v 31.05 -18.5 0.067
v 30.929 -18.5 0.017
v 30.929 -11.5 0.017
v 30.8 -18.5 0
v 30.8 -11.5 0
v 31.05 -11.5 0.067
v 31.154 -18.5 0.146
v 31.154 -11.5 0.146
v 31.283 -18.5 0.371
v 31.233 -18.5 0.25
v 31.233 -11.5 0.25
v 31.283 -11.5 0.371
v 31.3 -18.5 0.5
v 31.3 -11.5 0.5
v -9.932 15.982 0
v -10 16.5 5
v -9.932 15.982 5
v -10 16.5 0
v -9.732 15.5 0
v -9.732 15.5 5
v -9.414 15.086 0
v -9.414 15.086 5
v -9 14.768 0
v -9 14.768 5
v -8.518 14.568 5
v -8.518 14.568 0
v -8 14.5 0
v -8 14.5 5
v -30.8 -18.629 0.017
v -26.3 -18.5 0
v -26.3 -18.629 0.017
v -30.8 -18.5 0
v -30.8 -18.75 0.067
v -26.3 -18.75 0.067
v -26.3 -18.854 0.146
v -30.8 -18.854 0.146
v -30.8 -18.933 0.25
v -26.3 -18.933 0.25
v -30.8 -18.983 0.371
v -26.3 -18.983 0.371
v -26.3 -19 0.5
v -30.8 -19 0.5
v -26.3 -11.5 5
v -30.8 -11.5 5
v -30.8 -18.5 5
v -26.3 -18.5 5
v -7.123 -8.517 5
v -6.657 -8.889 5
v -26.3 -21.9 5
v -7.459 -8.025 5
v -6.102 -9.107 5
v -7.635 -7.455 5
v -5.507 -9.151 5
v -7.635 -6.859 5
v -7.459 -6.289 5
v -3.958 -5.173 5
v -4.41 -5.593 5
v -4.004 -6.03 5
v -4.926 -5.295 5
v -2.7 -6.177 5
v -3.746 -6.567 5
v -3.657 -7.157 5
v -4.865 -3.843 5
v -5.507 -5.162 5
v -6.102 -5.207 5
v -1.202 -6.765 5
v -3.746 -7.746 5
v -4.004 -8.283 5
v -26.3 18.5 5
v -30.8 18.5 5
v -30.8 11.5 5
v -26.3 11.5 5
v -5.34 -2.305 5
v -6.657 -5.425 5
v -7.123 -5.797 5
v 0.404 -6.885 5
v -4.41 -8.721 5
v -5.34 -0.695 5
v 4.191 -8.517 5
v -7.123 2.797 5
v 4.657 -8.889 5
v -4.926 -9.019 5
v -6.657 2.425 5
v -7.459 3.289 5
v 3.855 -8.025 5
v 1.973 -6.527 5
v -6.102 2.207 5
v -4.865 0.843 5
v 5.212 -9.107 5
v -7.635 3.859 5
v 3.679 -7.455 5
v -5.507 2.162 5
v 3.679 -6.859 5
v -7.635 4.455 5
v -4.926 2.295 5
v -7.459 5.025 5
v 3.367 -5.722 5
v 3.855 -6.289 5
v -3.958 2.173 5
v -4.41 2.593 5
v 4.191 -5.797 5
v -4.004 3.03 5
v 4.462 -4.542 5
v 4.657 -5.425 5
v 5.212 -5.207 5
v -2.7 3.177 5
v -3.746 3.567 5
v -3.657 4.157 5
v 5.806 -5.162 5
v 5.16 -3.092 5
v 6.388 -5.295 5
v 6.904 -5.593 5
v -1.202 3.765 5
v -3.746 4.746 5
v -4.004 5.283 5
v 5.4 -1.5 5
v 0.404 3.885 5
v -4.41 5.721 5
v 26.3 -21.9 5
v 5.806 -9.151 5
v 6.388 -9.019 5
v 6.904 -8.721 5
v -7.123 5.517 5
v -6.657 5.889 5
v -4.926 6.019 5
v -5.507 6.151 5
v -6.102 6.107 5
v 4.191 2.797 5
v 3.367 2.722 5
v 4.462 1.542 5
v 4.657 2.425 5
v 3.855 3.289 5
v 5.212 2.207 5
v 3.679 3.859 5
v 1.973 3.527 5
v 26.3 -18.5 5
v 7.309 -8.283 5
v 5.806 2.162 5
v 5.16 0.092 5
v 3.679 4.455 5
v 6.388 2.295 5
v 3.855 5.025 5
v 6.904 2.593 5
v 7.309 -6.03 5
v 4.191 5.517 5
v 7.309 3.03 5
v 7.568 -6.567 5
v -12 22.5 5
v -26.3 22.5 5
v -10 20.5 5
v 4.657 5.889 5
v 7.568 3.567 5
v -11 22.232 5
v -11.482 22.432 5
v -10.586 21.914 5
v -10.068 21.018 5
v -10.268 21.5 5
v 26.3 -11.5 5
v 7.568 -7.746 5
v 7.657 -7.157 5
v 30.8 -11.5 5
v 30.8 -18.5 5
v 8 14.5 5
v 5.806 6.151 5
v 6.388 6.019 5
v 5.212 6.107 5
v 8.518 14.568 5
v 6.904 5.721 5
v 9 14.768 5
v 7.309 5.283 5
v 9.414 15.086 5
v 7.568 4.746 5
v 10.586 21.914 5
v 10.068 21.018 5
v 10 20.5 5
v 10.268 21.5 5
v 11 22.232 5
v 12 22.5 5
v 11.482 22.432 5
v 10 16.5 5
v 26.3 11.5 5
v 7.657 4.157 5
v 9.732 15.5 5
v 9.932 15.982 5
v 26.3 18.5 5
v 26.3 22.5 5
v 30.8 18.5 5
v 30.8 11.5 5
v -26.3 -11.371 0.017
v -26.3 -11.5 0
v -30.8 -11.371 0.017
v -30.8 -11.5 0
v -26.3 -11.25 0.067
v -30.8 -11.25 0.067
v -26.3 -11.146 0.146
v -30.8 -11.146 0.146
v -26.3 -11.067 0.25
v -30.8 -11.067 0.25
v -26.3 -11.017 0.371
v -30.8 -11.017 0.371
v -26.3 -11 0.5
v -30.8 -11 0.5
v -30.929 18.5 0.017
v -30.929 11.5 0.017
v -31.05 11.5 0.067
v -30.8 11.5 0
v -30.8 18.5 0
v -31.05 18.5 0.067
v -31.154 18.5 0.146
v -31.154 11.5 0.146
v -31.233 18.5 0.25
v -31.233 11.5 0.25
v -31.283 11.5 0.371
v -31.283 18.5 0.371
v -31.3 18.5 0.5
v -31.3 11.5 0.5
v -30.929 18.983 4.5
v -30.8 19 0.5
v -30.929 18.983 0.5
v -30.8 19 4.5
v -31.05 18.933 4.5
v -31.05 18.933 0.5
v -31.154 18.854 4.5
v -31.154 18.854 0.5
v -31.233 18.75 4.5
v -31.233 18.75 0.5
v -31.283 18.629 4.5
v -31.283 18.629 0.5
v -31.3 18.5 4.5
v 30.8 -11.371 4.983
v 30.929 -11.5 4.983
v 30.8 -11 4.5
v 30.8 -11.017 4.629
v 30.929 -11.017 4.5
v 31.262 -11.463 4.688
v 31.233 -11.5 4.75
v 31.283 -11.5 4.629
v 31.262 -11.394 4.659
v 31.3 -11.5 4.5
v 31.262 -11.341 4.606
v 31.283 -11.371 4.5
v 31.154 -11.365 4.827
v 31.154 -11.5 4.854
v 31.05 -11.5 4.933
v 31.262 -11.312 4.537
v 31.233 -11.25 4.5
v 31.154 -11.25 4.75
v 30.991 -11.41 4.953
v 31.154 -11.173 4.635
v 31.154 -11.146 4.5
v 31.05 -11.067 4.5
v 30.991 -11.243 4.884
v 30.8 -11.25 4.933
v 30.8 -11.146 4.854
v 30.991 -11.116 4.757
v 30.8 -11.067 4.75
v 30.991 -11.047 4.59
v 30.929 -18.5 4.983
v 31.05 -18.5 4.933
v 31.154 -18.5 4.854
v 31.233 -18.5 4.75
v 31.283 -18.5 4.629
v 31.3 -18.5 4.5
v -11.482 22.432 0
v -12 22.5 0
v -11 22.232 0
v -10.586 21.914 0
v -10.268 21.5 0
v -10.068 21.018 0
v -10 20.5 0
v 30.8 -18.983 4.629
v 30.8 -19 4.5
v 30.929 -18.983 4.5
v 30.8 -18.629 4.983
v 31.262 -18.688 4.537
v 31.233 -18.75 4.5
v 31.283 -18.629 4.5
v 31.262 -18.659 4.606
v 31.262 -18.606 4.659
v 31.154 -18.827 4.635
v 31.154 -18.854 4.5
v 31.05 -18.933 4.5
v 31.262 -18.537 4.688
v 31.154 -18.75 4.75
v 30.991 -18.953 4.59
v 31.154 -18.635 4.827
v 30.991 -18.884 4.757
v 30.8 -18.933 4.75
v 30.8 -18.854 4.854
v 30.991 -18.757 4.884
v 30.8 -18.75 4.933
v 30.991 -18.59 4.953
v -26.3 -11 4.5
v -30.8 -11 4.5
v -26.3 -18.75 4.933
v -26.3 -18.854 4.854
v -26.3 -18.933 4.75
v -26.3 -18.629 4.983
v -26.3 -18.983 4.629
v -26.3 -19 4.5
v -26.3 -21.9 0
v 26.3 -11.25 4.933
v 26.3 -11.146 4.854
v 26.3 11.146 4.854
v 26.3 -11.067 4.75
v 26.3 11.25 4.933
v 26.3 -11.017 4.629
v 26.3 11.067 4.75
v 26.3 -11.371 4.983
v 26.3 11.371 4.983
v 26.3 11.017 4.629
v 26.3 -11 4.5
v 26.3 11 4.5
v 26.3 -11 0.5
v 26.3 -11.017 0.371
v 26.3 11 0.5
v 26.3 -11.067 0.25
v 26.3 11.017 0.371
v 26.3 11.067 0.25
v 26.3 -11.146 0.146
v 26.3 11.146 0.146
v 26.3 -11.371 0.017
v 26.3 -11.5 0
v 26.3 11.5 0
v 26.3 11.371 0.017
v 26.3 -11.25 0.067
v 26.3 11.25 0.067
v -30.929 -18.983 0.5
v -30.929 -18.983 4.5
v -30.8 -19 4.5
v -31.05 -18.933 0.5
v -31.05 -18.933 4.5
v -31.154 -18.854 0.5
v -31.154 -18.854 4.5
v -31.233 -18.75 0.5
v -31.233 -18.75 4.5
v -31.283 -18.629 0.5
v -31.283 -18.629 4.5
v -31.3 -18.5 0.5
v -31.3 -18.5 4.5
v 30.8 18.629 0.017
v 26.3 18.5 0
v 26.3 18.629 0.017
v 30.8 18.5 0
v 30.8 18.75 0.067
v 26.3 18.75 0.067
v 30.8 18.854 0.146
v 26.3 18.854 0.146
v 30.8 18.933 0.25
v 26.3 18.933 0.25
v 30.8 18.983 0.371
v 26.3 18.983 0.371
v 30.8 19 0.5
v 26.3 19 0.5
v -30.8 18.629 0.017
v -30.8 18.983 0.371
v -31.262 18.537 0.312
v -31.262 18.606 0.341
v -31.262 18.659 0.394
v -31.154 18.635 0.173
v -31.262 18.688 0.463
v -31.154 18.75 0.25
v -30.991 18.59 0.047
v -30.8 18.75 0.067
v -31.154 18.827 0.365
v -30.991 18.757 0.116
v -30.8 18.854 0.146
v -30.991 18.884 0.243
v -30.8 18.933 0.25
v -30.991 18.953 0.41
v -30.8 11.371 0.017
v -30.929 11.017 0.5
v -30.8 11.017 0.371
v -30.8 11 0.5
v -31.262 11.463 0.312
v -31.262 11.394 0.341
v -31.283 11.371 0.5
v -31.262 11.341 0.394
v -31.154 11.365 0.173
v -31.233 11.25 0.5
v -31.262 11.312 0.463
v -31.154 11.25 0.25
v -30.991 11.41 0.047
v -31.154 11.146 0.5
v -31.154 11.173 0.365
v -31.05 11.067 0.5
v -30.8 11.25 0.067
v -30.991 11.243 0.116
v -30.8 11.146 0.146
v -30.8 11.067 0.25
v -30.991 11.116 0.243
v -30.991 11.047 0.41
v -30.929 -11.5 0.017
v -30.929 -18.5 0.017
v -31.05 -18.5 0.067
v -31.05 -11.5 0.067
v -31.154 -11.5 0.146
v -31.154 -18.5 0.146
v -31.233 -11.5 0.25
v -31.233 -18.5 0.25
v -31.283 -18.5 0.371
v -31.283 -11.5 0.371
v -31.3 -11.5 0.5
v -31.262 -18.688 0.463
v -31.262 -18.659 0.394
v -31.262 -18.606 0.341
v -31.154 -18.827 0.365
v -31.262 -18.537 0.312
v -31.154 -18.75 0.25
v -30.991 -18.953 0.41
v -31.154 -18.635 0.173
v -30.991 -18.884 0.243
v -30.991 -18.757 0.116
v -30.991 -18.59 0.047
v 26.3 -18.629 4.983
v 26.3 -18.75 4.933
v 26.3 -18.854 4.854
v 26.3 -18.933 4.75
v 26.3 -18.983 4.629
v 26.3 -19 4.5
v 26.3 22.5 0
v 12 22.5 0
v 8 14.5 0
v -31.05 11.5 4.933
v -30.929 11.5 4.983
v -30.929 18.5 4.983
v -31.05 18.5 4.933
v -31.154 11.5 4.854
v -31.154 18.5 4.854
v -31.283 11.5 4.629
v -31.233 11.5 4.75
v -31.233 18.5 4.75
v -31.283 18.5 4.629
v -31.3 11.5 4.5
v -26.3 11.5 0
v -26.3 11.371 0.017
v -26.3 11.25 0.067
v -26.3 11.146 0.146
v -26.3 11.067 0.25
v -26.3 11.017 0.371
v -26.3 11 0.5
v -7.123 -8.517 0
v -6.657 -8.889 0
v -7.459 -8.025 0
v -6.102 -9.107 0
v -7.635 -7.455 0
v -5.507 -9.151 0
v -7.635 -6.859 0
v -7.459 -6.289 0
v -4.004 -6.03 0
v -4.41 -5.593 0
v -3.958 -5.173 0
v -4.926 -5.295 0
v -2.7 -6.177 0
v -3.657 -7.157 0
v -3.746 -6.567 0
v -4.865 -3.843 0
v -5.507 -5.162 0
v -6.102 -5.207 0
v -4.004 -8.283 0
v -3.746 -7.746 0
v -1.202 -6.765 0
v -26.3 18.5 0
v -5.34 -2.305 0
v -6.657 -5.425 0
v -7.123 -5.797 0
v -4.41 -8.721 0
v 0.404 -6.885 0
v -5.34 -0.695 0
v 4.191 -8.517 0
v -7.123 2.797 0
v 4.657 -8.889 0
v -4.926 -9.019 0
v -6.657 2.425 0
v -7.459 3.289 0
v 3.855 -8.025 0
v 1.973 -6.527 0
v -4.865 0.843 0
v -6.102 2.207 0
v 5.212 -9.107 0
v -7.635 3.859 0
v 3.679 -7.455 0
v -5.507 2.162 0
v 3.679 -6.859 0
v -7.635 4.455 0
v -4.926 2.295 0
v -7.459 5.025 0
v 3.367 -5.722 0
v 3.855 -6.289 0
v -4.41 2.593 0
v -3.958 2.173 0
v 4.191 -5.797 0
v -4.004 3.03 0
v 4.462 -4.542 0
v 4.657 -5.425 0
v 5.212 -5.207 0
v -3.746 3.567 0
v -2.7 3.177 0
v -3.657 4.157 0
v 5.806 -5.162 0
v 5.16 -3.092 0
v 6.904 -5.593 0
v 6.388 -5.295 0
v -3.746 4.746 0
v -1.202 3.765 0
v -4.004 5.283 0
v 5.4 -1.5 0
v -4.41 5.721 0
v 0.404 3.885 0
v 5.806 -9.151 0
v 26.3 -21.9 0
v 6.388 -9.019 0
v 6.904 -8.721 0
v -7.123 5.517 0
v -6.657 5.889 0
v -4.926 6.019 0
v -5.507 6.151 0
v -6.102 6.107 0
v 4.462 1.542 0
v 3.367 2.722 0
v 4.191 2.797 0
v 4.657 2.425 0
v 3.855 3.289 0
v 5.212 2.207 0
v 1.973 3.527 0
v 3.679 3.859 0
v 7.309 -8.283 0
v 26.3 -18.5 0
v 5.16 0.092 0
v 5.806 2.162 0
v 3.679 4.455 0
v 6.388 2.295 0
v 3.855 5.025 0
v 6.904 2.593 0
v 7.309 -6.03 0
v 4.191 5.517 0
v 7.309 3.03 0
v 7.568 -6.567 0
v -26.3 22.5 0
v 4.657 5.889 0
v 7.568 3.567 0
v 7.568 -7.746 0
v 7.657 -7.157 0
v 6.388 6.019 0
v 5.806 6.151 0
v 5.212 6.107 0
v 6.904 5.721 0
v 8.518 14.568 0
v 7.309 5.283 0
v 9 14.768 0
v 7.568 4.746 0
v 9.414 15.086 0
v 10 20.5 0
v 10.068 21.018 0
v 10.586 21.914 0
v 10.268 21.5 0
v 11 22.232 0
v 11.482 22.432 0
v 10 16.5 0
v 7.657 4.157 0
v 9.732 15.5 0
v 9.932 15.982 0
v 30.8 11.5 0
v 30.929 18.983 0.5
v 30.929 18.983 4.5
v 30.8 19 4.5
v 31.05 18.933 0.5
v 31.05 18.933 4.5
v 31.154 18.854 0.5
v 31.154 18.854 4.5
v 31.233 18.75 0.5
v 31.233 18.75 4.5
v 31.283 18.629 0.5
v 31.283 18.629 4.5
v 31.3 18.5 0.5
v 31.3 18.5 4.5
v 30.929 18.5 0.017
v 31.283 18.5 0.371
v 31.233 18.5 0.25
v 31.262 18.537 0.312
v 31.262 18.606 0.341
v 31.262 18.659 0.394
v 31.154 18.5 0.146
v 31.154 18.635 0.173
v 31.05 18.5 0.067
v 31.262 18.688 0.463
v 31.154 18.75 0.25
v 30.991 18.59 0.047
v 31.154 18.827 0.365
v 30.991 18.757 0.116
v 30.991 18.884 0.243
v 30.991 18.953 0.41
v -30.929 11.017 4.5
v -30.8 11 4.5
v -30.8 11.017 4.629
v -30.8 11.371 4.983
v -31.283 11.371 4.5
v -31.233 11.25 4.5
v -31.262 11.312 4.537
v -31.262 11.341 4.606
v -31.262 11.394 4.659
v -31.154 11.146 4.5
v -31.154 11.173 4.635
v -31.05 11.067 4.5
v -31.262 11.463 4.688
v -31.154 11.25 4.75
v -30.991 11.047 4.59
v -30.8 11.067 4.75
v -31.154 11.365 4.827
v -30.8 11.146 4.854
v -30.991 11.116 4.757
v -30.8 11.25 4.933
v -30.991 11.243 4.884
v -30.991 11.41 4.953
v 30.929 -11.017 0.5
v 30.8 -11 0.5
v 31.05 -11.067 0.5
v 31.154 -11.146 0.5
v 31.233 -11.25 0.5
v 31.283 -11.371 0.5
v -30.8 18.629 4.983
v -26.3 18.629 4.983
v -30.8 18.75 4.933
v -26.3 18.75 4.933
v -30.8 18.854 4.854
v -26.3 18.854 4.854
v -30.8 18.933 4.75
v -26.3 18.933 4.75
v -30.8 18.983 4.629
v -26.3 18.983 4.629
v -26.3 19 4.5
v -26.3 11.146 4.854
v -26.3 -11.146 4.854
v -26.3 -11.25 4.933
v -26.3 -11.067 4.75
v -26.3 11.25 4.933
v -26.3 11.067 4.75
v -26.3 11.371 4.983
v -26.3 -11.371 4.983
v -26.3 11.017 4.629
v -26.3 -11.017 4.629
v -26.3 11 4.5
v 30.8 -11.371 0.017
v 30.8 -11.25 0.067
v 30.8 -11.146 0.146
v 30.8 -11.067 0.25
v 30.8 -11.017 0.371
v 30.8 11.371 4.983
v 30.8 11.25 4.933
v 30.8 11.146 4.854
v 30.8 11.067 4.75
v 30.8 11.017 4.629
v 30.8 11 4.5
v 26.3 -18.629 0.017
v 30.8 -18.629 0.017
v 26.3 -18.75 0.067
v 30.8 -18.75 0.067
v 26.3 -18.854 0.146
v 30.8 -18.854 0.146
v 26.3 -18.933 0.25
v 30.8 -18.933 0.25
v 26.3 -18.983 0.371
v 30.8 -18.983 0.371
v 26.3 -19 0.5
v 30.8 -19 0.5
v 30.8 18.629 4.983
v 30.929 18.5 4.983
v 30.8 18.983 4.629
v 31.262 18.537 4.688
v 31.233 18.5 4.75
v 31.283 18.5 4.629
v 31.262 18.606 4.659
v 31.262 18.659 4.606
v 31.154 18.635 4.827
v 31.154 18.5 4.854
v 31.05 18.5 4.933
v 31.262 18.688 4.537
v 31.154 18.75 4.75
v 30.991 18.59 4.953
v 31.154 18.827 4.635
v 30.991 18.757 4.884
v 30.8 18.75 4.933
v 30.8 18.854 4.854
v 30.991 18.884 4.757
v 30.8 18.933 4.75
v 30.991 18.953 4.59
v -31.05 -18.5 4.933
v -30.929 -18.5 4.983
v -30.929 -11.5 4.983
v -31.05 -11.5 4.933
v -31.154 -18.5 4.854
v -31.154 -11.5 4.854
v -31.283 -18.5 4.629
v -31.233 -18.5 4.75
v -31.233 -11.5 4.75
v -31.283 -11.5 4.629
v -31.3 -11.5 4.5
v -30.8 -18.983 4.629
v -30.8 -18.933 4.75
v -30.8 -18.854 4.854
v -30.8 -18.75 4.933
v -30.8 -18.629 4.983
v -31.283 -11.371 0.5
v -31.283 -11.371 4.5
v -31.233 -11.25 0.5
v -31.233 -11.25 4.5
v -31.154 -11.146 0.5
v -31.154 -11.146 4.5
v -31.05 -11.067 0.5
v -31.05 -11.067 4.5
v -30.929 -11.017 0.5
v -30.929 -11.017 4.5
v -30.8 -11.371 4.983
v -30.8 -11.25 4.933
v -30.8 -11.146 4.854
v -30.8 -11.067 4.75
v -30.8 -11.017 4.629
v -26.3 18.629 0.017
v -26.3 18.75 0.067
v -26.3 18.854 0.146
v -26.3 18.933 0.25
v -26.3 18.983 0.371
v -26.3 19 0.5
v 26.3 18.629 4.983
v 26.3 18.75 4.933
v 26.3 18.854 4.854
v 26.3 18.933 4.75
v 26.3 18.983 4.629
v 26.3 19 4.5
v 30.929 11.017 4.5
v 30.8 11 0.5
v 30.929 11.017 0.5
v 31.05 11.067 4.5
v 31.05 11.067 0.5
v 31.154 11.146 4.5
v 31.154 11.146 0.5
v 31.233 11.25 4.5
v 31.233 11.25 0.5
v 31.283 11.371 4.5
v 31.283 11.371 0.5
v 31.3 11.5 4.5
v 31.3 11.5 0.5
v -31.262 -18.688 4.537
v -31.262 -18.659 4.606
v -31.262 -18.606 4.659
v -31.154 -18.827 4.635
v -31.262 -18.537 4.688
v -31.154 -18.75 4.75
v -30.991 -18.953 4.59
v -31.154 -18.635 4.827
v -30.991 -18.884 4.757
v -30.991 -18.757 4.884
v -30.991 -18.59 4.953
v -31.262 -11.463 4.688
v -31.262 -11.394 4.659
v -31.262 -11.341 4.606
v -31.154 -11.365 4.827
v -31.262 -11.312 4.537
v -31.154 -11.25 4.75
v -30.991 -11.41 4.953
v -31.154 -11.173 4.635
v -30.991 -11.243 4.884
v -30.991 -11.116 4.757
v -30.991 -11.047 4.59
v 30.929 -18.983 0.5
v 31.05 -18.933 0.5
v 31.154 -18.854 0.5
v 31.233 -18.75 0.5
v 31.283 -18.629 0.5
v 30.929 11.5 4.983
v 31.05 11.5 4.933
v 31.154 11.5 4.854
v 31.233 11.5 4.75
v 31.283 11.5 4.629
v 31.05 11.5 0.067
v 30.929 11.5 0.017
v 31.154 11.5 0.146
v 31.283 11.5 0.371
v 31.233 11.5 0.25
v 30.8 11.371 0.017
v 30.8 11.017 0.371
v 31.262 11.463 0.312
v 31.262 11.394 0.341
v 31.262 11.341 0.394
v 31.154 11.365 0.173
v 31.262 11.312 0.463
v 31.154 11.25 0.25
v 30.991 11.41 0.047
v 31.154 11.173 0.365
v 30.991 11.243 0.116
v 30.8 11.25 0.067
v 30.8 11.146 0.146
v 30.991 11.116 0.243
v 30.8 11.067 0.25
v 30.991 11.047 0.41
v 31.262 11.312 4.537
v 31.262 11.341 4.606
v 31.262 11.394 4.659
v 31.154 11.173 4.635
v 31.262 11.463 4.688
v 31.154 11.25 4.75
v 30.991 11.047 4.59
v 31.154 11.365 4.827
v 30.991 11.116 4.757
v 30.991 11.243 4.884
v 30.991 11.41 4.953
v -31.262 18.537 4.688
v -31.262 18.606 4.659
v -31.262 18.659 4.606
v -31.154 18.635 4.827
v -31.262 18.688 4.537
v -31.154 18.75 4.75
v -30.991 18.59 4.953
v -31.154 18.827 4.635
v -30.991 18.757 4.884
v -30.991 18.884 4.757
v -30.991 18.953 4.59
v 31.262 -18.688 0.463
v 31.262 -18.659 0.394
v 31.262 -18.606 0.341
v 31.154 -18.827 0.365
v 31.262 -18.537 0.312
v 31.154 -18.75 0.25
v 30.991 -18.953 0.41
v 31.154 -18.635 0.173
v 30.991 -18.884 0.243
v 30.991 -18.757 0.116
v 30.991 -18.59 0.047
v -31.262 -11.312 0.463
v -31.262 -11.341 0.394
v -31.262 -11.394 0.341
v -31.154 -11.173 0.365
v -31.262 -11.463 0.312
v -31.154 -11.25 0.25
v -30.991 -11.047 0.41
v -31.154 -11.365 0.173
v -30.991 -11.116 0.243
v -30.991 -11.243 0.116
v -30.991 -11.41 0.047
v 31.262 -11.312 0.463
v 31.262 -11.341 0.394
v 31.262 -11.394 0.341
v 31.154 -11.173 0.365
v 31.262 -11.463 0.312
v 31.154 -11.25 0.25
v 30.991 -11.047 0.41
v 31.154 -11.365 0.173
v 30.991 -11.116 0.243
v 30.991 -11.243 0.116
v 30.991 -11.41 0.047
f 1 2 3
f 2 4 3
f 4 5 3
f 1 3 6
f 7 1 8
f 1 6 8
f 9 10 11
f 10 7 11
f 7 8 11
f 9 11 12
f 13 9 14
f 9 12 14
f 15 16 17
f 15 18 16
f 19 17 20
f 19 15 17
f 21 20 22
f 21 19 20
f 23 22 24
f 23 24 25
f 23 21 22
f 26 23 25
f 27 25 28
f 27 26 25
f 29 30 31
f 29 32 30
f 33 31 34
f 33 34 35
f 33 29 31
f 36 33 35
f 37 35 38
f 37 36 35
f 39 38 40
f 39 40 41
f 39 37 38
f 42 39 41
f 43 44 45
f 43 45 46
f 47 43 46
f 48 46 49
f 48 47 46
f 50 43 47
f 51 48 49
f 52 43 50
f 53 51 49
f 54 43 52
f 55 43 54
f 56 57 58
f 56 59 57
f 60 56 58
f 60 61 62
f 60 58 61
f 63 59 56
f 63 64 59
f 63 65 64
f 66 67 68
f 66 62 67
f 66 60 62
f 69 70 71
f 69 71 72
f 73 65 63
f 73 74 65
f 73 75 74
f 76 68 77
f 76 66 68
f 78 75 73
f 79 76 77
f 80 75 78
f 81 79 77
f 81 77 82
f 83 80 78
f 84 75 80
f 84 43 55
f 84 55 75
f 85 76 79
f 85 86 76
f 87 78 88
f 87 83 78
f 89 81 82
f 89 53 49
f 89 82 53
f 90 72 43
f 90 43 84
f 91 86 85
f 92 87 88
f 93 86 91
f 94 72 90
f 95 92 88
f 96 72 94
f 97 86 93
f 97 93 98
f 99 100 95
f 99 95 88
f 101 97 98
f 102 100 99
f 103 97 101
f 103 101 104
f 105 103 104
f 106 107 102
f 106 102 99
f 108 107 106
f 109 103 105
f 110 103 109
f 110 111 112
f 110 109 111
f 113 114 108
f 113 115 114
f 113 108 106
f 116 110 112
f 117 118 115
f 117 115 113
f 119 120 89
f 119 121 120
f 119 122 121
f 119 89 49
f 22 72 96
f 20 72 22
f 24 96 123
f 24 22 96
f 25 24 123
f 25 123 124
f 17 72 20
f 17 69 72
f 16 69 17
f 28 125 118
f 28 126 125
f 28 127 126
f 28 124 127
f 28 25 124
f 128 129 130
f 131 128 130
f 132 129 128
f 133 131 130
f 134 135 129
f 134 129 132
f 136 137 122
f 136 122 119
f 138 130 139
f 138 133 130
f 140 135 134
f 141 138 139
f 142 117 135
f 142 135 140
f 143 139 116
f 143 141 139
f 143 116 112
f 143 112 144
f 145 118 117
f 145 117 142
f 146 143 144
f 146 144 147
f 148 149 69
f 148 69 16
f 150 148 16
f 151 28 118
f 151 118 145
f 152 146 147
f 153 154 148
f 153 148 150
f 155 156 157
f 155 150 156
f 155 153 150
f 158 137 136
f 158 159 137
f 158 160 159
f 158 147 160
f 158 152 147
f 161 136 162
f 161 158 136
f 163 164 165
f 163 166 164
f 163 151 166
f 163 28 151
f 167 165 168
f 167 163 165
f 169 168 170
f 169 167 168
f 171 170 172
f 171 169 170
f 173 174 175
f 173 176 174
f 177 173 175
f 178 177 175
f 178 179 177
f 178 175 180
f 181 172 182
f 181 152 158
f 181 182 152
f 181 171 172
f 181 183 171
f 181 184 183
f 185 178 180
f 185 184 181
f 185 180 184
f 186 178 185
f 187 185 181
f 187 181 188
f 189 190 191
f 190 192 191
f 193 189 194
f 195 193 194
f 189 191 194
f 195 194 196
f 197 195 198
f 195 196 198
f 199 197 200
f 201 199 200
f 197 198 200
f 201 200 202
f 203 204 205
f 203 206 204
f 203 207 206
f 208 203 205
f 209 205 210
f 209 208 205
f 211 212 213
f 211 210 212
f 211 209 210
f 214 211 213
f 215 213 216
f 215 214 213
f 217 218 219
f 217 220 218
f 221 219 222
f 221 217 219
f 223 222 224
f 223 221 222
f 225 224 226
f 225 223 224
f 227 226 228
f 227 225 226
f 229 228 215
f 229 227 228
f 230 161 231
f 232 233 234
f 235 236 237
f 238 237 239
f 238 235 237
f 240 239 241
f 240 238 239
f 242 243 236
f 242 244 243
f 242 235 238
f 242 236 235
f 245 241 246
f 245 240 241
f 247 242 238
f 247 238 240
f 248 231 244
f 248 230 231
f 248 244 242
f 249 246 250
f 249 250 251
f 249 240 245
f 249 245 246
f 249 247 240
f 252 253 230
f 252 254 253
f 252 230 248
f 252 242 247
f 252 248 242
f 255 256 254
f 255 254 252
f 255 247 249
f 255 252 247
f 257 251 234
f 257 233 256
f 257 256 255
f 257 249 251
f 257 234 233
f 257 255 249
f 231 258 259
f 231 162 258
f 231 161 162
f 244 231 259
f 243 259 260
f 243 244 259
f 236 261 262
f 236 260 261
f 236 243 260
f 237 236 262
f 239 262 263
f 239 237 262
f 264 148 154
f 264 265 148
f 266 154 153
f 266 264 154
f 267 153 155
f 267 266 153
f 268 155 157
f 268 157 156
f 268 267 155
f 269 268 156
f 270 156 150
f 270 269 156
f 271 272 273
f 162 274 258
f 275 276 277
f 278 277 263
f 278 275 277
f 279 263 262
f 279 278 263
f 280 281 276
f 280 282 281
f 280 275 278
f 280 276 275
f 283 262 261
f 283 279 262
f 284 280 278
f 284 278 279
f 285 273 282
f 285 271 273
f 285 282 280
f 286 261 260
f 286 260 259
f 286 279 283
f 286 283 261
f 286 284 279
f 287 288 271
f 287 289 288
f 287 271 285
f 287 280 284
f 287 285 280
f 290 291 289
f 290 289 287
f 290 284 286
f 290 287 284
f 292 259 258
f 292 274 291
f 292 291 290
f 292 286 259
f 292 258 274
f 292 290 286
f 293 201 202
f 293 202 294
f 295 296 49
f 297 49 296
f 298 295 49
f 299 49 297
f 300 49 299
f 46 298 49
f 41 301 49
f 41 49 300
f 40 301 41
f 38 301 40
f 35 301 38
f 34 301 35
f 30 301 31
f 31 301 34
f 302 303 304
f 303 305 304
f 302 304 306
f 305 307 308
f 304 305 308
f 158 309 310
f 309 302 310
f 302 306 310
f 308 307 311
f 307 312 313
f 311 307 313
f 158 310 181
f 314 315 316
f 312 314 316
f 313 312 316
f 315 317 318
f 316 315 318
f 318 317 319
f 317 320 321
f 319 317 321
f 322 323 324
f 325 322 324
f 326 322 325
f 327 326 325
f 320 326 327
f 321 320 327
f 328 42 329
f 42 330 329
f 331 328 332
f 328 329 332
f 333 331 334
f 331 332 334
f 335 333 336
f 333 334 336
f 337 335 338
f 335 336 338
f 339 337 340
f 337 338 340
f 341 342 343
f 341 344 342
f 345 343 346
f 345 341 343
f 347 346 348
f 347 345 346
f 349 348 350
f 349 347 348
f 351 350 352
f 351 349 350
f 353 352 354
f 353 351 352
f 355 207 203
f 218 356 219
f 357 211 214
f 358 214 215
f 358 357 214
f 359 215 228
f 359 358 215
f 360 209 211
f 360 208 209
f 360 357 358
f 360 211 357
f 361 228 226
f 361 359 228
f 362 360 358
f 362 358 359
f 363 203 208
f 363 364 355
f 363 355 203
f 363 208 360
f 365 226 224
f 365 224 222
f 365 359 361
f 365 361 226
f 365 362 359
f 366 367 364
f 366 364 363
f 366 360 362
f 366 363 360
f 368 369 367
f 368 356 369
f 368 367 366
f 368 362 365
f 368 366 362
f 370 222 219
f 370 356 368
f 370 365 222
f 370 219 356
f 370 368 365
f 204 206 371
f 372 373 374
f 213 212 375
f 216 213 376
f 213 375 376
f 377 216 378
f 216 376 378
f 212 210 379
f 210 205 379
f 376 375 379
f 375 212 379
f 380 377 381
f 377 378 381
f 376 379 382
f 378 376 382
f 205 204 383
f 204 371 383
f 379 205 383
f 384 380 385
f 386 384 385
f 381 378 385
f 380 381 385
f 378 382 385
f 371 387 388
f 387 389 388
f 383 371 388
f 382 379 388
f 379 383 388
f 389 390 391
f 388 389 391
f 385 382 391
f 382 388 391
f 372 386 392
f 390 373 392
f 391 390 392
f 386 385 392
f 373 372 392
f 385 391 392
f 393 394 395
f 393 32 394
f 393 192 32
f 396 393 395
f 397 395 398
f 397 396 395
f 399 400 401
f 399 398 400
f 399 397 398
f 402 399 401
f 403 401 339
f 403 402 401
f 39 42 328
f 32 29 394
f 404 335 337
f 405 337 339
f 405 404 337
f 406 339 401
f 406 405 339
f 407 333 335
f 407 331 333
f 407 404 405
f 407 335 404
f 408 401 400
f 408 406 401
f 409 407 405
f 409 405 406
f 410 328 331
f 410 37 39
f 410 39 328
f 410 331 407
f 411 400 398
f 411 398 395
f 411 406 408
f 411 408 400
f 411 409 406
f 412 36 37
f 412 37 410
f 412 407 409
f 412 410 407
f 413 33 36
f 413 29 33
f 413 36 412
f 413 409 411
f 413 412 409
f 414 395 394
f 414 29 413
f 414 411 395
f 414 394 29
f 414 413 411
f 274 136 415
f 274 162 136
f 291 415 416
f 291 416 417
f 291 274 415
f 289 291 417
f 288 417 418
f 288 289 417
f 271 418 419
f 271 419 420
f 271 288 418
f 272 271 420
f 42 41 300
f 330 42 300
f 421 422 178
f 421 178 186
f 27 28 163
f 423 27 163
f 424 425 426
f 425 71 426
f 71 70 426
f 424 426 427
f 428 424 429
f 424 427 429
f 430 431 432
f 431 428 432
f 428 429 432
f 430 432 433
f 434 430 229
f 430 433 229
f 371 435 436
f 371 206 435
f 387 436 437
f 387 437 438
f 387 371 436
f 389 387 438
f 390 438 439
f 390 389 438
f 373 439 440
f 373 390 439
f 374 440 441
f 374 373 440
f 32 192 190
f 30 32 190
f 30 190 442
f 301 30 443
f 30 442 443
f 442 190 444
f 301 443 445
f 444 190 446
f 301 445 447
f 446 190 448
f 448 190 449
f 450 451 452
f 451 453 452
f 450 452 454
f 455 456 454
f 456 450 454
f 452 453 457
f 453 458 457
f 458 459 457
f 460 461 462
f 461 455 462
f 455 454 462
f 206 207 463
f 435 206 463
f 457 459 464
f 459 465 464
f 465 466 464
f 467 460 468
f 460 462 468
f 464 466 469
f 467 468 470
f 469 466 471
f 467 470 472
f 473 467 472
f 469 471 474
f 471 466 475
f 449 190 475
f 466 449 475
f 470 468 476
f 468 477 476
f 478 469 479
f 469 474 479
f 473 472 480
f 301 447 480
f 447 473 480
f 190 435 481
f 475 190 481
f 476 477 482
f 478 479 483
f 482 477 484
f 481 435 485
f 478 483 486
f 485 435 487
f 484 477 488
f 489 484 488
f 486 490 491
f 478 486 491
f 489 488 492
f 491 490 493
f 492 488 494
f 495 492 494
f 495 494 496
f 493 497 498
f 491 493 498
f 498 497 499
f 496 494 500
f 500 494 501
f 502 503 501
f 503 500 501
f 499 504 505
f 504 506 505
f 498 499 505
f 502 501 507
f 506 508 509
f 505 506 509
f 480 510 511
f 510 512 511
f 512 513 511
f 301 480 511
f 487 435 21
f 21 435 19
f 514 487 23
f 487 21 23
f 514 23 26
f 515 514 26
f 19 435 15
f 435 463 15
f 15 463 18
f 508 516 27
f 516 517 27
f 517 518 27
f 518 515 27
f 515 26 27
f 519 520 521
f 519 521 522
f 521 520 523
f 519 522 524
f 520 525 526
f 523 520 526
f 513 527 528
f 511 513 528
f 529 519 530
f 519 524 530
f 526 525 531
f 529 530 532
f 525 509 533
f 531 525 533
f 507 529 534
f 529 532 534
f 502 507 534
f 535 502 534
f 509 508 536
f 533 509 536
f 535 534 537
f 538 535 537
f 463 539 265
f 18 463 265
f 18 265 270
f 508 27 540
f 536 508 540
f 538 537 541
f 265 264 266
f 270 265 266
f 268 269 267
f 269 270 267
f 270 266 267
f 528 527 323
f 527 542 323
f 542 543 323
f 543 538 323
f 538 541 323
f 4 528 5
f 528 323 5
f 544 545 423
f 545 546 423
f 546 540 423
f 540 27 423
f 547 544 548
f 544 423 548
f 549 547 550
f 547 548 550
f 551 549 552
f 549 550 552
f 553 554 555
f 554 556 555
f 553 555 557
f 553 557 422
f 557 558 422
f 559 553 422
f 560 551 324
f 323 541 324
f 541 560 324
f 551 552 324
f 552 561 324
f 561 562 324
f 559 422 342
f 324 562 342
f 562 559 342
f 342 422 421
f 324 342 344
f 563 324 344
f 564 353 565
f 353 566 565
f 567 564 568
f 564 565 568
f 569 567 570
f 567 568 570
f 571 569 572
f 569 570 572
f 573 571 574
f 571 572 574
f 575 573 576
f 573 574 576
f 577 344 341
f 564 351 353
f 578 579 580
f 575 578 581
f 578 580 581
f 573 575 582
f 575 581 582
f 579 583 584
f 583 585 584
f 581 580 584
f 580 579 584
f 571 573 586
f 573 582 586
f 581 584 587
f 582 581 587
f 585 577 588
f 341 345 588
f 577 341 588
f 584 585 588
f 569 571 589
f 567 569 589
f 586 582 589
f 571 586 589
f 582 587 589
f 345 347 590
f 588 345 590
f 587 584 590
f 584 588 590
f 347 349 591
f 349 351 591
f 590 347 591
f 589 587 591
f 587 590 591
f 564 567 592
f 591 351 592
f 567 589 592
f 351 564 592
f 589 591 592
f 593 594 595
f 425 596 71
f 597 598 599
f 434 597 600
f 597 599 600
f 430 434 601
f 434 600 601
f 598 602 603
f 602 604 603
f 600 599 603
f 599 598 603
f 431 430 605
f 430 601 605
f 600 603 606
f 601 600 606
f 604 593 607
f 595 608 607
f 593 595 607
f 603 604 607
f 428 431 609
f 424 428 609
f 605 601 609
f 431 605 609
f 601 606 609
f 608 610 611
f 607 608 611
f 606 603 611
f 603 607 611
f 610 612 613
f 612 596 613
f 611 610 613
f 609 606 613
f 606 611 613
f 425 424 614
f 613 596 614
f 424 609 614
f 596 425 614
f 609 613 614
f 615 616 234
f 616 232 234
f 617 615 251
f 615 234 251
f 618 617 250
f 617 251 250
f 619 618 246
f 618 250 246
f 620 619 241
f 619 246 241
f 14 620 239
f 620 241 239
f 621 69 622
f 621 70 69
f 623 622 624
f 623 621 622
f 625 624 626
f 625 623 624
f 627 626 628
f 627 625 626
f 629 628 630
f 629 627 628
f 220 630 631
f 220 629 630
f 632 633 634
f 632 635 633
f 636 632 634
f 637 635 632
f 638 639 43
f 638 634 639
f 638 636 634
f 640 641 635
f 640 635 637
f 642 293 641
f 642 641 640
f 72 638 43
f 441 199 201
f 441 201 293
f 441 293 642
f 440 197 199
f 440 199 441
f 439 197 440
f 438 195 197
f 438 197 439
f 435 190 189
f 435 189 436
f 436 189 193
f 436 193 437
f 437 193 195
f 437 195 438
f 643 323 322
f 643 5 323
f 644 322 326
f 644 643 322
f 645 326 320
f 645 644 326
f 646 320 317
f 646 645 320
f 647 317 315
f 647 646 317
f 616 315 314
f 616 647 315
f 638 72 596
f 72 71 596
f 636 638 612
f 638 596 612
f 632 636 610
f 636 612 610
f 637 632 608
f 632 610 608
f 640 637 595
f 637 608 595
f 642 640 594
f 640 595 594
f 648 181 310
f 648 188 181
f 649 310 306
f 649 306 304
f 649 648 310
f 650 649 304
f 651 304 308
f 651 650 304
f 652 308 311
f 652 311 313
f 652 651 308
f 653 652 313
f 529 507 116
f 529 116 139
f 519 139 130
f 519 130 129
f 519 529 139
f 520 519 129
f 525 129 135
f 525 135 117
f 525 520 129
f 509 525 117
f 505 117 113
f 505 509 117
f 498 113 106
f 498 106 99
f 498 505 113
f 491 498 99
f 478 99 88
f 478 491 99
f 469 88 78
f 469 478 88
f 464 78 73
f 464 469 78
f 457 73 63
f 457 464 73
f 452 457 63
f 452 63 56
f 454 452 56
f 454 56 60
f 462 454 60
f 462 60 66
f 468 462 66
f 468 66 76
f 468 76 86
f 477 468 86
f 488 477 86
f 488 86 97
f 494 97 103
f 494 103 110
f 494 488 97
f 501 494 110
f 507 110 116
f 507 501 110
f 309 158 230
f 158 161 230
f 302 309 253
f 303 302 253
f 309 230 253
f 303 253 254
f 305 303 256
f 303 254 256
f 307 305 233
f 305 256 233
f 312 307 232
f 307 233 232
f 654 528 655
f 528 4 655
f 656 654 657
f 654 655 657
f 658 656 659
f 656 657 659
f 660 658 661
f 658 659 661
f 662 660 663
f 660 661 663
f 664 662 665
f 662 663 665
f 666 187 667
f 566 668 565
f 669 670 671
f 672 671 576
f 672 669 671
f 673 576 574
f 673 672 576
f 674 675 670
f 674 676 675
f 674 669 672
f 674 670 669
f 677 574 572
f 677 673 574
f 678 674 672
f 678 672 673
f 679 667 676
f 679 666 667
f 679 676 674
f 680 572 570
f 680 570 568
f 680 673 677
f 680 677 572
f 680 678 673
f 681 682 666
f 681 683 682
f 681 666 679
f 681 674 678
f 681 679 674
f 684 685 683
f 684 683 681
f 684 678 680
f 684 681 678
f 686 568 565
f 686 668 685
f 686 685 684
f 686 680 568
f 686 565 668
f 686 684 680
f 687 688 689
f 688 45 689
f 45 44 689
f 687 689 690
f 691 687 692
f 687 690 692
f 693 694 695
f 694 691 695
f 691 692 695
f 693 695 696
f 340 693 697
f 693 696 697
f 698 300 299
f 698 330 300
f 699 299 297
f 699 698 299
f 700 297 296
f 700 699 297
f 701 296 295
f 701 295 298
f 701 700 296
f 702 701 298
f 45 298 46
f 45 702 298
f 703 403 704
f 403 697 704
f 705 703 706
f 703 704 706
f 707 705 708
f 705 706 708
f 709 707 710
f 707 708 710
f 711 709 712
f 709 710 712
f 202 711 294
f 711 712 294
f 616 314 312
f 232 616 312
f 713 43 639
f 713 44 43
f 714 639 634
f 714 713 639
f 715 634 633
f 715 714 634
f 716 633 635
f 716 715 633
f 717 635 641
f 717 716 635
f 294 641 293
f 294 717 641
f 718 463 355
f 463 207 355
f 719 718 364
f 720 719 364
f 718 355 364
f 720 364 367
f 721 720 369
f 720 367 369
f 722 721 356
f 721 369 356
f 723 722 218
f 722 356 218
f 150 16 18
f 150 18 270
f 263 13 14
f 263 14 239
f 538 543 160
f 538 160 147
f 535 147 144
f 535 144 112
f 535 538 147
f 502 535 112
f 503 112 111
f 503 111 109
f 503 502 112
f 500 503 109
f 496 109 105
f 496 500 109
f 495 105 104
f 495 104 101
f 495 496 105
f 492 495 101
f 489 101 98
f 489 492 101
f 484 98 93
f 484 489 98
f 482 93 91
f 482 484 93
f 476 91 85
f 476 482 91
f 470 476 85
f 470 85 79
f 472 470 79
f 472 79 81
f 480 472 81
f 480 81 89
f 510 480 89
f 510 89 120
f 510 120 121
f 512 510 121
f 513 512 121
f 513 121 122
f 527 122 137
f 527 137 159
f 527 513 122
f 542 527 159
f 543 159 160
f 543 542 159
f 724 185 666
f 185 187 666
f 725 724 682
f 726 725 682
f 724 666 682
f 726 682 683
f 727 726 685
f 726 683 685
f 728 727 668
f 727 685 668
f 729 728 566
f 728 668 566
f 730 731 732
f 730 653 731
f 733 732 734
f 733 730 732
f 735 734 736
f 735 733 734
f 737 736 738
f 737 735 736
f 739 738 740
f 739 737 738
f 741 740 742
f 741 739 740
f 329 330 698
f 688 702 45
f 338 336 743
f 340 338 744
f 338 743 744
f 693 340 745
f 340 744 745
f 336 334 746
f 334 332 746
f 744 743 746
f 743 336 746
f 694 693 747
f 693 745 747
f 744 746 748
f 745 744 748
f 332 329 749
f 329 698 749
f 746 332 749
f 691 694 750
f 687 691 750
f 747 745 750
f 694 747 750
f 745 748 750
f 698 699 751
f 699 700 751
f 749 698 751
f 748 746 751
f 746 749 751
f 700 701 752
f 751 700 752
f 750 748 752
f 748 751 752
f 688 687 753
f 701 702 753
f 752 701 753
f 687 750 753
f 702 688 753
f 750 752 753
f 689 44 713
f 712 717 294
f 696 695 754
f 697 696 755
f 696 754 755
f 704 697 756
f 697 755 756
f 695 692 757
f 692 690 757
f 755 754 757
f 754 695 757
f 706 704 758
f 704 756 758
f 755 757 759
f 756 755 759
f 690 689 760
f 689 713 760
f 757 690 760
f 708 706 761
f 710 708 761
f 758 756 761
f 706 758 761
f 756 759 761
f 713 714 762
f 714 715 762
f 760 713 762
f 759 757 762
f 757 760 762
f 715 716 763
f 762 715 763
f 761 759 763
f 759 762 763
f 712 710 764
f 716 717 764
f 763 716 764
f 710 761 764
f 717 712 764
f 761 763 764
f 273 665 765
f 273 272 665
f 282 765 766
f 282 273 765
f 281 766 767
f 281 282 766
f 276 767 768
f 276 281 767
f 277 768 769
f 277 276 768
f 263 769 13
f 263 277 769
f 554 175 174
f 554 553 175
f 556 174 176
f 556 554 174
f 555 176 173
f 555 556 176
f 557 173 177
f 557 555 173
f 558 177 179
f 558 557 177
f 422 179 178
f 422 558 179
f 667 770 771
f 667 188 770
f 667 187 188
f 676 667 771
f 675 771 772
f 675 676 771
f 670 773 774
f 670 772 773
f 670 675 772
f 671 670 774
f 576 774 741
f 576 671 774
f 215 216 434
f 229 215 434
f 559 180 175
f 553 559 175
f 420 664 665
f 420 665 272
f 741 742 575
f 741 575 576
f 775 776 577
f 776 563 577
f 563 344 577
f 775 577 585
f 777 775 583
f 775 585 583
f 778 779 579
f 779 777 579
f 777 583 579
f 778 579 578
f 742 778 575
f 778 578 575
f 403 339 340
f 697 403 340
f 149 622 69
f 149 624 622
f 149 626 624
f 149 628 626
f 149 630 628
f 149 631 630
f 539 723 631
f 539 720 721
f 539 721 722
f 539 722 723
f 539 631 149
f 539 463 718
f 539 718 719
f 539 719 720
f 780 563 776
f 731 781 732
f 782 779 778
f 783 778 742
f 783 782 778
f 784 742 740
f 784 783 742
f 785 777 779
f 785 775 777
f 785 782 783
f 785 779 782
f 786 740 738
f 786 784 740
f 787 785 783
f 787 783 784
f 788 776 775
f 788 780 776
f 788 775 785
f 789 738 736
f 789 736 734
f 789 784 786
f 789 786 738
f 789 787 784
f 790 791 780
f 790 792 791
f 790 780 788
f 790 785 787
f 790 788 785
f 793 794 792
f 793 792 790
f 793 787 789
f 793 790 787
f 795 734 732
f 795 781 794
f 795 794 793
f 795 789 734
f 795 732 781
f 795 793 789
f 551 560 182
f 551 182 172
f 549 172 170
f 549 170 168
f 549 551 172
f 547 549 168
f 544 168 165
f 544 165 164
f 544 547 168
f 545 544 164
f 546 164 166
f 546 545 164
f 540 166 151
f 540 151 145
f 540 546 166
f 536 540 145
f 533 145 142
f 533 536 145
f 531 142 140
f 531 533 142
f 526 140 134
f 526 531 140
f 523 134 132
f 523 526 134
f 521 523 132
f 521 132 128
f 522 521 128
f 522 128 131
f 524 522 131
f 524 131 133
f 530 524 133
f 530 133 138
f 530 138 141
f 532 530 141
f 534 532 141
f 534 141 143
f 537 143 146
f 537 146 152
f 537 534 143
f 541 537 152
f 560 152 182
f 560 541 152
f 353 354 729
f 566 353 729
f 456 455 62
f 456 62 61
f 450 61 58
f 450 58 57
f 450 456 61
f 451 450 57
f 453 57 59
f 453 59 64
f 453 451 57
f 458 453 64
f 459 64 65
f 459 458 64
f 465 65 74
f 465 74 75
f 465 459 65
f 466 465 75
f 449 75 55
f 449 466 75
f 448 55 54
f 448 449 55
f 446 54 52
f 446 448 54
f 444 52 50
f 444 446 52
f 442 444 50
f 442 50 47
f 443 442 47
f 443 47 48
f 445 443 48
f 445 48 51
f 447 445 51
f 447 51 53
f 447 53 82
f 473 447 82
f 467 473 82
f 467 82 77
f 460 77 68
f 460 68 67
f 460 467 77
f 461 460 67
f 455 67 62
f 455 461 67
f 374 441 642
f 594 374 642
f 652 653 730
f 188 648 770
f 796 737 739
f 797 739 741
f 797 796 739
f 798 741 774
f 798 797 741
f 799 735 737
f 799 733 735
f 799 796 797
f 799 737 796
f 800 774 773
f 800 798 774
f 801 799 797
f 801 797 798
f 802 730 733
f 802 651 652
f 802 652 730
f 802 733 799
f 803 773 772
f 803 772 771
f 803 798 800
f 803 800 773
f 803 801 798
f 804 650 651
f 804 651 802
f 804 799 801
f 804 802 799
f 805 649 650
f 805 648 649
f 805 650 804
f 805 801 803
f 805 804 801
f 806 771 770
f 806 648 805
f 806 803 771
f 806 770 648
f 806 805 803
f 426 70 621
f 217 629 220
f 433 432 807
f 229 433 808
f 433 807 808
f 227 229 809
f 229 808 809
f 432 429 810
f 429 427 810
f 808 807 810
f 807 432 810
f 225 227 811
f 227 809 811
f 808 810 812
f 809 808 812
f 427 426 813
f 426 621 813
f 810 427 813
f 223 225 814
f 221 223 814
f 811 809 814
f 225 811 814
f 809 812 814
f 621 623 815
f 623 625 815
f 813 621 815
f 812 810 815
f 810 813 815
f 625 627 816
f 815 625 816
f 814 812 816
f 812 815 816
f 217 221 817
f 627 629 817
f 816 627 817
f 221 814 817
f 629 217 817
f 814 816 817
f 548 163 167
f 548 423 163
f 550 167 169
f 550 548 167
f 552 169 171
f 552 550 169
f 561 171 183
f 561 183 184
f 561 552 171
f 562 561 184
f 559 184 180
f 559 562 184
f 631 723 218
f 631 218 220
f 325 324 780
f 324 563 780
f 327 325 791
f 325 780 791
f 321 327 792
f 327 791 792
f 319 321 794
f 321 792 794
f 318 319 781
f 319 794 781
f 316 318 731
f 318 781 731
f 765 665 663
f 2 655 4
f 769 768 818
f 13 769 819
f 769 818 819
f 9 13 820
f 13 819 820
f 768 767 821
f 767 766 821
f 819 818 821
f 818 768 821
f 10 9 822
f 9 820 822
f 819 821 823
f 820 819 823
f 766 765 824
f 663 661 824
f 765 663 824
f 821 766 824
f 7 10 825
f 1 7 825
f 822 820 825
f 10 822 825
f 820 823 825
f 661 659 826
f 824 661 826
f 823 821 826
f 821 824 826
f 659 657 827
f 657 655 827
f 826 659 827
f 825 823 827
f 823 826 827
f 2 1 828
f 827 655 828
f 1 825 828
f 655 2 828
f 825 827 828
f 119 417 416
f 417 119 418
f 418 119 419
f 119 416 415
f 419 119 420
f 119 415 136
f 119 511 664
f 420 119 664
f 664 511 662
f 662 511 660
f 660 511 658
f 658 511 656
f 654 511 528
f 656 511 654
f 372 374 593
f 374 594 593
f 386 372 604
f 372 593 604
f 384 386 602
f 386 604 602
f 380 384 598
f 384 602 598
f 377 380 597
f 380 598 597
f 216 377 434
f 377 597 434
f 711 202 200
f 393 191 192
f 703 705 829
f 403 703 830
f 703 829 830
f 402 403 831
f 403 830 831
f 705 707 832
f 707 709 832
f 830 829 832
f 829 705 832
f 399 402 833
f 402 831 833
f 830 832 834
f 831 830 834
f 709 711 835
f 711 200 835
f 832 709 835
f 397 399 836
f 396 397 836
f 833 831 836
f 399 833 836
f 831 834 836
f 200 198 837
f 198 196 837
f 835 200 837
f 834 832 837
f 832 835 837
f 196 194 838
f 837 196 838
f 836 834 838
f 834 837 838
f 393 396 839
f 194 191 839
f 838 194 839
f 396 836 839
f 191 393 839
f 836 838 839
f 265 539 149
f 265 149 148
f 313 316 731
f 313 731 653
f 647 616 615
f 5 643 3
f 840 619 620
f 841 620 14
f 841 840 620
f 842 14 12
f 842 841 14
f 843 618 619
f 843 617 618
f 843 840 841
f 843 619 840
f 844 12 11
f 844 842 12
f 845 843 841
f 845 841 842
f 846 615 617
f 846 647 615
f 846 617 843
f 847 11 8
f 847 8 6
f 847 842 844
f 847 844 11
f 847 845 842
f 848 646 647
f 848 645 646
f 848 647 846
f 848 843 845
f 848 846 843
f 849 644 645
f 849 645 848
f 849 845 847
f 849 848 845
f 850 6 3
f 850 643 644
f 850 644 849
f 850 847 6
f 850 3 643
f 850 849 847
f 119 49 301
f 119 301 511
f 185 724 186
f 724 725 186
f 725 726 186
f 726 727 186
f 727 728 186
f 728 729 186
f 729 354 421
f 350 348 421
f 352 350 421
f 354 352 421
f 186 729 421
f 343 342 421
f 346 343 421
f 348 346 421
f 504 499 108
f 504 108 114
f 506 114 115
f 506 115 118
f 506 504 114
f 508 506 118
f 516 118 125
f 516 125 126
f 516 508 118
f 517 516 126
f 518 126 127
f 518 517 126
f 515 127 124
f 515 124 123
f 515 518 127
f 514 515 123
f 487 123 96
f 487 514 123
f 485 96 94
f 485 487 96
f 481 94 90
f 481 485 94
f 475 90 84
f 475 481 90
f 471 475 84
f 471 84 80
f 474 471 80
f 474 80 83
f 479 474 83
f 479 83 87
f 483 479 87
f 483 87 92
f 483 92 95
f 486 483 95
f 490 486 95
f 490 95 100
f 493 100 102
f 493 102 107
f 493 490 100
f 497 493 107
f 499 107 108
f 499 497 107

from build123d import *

# Parameters (mm, degrees)
CROQUIS1_W               = 52.6
CROQUIS1_H               = 45
CROQUIS1_R               = 5.4
CROQUIS1_R_2             = 2
SALIENTE_EXTRUIR1_DEPTH  = 5
CROQUIS2_W               = 5
CROQUIS2_H               = 8
SALIENTE_EXTRUIR2_DEPTH  = 5
REDONDEO1_R              = 0.5
REDONDEO1_OF_SIMETR_A1_R = 0.5
CROQUIS3_W               = 20
CROQUIS3_H               = 8
CORTAR_EXTRUIR1_DEPTH    = 5
REDONDEO2_R              = 2
CROQUIS4_W               = 52.6
CROQUIS4_H               = 0.6
CORTAR_EXTRUIR2_DEPTH    = 5


with BuildPart() as part:
    # Croquis1 → Saliente-Extruir1 (new body)
    with BuildSketch(Plane.XY):
        Rectangle(CROQUIS1_W, CROQUIS1_H)
        with Locations((0, -1.5)):
            Circle(CROQUIS1_R, mode=Mode.SUBTRACT)
        with Locations((-5.656854249, 4.156854249)):
            Circle(CROQUIS1_R_2, mode=Mode.SUBTRACT)
        with Locations((5.656854249, 4.156854249)):
            Circle(CROQUIS1_R_2, mode=Mode.SUBTRACT)
        with Locations((5.656854249, -7.156854249)):
            Circle(CROQUIS1_R_2, mode=Mode.SUBTRACT)
        with Locations((-5.656854249, -7.156854249)):
            Circle(CROQUIS1_R_2, mode=Mode.SUBTRACT)
    extrude(amount=SALIENTE_EXTRUIR1_DEPTH)

    # Croquis2 → Saliente-Extruir2 (add)
    with BuildSketch(Plane.ZY.offset(26.3)):
        with Locations((2.5, 15)):
            Rectangle(CROQUIS2_W, CROQUIS2_H)
        with Locations((2.5, -15)):
            Rectangle(CROQUIS2_W, CROQUIS2_H)
    saliente_extruir2 = extrude(amount=SALIENTE_EXTRUIR2_DEPTH)

    # Redondeo1
    redondeo1_edges = [part.edges().sort_by_distance(p)[0] for p in [
        (-28.8, 19, 0),
        (-28.8, 11, 0),
        (-28.8, 11, 5),
        (-28.8, 19, 5),
        (-31.3, 15, 0),
        (-31.3, 11, 2.5),
        (-31.3, 15, 5),
        (-31.3, 19, 2.5),
        (-28.8, -19, 0),
        (-28.8, -19, 5),
        (-28.8, -11, 5),
        (-28.8, -11, 0),
        (-31.3, -19, 2.5),
        (-31.3, -15, 5),
        (-31.3, -11, 2.5),
        (-31.3, -15, 0),
    ]]
    fillet(redondeo1_edges, radius=REDONDEO1_R)

    # Simetría1: Saliente-Extruir2 across plane
    add(saliente_extruir2.mirror(Plane(origin=(0, 0, 0), x_dir=(0, 0, 1), z_dir=(1, 0, 0))))

    # Redondeo1 of Simetría1
    redondeo1_of_simetr_a1_edges = [part.edges().sort_by_distance(p)[0] for p in [
        (28.8, 19, 0),
        (28.8, 11, 0),
        (28.8, 11, 5),
        (28.8, 19, 5),
        (31.3, 15, 0),
        (31.3, 11, 2.5),
        (31.3, 15, 5),
        (31.3, 19, 2.5),
        (28.8, -19, 0),
        (28.8, -19, 5),
        (28.8, -11, 5),
        (28.8, -11, 0),
        (31.3, -19, 2.5),
        (31.3, -15, 5),
        (31.3, -11, 2.5),
        (31.3, -15, 0),
    ]]
    fillet(redondeo1_of_simetr_a1_edges, radius=REDONDEO1_OF_SIMETR_A1_R)

    # Croquis3 → Cortar-Extruir1 (cut)
    with BuildSketch(Plane.XY.offset(5)):
        with Locations((0, 18.5)):
            Rectangle(CROQUIS3_W, CROQUIS3_H)
    extrude(amount=-CORTAR_EXTRUIR1_DEPTH, mode=Mode.SUBTRACT)

    # Redondeo2
    redondeo2_edges = [part.edges().sort_by_distance(p)[0] for p in [
        (-10, 14.5, 2.5),
        (-10, 22.5, 2.5),
        (10, 22.5, 2.5),
        (10, 14.5, 2.5),
    ]]
    fillet(redondeo2_edges, radius=REDONDEO2_R)

    # Croquis4 → Cortar-Extruir2 (cut)
    with BuildSketch(Plane.XY.offset(5)):
        with Locations((0, -22.2)):
            Rectangle(CROQUIS4_W, CROQUIS4_H)
    extrude(amount=-CORTAR_EXTRUIR2_DEPTH, mode=Mode.SUBTRACT)


solid = part.part
